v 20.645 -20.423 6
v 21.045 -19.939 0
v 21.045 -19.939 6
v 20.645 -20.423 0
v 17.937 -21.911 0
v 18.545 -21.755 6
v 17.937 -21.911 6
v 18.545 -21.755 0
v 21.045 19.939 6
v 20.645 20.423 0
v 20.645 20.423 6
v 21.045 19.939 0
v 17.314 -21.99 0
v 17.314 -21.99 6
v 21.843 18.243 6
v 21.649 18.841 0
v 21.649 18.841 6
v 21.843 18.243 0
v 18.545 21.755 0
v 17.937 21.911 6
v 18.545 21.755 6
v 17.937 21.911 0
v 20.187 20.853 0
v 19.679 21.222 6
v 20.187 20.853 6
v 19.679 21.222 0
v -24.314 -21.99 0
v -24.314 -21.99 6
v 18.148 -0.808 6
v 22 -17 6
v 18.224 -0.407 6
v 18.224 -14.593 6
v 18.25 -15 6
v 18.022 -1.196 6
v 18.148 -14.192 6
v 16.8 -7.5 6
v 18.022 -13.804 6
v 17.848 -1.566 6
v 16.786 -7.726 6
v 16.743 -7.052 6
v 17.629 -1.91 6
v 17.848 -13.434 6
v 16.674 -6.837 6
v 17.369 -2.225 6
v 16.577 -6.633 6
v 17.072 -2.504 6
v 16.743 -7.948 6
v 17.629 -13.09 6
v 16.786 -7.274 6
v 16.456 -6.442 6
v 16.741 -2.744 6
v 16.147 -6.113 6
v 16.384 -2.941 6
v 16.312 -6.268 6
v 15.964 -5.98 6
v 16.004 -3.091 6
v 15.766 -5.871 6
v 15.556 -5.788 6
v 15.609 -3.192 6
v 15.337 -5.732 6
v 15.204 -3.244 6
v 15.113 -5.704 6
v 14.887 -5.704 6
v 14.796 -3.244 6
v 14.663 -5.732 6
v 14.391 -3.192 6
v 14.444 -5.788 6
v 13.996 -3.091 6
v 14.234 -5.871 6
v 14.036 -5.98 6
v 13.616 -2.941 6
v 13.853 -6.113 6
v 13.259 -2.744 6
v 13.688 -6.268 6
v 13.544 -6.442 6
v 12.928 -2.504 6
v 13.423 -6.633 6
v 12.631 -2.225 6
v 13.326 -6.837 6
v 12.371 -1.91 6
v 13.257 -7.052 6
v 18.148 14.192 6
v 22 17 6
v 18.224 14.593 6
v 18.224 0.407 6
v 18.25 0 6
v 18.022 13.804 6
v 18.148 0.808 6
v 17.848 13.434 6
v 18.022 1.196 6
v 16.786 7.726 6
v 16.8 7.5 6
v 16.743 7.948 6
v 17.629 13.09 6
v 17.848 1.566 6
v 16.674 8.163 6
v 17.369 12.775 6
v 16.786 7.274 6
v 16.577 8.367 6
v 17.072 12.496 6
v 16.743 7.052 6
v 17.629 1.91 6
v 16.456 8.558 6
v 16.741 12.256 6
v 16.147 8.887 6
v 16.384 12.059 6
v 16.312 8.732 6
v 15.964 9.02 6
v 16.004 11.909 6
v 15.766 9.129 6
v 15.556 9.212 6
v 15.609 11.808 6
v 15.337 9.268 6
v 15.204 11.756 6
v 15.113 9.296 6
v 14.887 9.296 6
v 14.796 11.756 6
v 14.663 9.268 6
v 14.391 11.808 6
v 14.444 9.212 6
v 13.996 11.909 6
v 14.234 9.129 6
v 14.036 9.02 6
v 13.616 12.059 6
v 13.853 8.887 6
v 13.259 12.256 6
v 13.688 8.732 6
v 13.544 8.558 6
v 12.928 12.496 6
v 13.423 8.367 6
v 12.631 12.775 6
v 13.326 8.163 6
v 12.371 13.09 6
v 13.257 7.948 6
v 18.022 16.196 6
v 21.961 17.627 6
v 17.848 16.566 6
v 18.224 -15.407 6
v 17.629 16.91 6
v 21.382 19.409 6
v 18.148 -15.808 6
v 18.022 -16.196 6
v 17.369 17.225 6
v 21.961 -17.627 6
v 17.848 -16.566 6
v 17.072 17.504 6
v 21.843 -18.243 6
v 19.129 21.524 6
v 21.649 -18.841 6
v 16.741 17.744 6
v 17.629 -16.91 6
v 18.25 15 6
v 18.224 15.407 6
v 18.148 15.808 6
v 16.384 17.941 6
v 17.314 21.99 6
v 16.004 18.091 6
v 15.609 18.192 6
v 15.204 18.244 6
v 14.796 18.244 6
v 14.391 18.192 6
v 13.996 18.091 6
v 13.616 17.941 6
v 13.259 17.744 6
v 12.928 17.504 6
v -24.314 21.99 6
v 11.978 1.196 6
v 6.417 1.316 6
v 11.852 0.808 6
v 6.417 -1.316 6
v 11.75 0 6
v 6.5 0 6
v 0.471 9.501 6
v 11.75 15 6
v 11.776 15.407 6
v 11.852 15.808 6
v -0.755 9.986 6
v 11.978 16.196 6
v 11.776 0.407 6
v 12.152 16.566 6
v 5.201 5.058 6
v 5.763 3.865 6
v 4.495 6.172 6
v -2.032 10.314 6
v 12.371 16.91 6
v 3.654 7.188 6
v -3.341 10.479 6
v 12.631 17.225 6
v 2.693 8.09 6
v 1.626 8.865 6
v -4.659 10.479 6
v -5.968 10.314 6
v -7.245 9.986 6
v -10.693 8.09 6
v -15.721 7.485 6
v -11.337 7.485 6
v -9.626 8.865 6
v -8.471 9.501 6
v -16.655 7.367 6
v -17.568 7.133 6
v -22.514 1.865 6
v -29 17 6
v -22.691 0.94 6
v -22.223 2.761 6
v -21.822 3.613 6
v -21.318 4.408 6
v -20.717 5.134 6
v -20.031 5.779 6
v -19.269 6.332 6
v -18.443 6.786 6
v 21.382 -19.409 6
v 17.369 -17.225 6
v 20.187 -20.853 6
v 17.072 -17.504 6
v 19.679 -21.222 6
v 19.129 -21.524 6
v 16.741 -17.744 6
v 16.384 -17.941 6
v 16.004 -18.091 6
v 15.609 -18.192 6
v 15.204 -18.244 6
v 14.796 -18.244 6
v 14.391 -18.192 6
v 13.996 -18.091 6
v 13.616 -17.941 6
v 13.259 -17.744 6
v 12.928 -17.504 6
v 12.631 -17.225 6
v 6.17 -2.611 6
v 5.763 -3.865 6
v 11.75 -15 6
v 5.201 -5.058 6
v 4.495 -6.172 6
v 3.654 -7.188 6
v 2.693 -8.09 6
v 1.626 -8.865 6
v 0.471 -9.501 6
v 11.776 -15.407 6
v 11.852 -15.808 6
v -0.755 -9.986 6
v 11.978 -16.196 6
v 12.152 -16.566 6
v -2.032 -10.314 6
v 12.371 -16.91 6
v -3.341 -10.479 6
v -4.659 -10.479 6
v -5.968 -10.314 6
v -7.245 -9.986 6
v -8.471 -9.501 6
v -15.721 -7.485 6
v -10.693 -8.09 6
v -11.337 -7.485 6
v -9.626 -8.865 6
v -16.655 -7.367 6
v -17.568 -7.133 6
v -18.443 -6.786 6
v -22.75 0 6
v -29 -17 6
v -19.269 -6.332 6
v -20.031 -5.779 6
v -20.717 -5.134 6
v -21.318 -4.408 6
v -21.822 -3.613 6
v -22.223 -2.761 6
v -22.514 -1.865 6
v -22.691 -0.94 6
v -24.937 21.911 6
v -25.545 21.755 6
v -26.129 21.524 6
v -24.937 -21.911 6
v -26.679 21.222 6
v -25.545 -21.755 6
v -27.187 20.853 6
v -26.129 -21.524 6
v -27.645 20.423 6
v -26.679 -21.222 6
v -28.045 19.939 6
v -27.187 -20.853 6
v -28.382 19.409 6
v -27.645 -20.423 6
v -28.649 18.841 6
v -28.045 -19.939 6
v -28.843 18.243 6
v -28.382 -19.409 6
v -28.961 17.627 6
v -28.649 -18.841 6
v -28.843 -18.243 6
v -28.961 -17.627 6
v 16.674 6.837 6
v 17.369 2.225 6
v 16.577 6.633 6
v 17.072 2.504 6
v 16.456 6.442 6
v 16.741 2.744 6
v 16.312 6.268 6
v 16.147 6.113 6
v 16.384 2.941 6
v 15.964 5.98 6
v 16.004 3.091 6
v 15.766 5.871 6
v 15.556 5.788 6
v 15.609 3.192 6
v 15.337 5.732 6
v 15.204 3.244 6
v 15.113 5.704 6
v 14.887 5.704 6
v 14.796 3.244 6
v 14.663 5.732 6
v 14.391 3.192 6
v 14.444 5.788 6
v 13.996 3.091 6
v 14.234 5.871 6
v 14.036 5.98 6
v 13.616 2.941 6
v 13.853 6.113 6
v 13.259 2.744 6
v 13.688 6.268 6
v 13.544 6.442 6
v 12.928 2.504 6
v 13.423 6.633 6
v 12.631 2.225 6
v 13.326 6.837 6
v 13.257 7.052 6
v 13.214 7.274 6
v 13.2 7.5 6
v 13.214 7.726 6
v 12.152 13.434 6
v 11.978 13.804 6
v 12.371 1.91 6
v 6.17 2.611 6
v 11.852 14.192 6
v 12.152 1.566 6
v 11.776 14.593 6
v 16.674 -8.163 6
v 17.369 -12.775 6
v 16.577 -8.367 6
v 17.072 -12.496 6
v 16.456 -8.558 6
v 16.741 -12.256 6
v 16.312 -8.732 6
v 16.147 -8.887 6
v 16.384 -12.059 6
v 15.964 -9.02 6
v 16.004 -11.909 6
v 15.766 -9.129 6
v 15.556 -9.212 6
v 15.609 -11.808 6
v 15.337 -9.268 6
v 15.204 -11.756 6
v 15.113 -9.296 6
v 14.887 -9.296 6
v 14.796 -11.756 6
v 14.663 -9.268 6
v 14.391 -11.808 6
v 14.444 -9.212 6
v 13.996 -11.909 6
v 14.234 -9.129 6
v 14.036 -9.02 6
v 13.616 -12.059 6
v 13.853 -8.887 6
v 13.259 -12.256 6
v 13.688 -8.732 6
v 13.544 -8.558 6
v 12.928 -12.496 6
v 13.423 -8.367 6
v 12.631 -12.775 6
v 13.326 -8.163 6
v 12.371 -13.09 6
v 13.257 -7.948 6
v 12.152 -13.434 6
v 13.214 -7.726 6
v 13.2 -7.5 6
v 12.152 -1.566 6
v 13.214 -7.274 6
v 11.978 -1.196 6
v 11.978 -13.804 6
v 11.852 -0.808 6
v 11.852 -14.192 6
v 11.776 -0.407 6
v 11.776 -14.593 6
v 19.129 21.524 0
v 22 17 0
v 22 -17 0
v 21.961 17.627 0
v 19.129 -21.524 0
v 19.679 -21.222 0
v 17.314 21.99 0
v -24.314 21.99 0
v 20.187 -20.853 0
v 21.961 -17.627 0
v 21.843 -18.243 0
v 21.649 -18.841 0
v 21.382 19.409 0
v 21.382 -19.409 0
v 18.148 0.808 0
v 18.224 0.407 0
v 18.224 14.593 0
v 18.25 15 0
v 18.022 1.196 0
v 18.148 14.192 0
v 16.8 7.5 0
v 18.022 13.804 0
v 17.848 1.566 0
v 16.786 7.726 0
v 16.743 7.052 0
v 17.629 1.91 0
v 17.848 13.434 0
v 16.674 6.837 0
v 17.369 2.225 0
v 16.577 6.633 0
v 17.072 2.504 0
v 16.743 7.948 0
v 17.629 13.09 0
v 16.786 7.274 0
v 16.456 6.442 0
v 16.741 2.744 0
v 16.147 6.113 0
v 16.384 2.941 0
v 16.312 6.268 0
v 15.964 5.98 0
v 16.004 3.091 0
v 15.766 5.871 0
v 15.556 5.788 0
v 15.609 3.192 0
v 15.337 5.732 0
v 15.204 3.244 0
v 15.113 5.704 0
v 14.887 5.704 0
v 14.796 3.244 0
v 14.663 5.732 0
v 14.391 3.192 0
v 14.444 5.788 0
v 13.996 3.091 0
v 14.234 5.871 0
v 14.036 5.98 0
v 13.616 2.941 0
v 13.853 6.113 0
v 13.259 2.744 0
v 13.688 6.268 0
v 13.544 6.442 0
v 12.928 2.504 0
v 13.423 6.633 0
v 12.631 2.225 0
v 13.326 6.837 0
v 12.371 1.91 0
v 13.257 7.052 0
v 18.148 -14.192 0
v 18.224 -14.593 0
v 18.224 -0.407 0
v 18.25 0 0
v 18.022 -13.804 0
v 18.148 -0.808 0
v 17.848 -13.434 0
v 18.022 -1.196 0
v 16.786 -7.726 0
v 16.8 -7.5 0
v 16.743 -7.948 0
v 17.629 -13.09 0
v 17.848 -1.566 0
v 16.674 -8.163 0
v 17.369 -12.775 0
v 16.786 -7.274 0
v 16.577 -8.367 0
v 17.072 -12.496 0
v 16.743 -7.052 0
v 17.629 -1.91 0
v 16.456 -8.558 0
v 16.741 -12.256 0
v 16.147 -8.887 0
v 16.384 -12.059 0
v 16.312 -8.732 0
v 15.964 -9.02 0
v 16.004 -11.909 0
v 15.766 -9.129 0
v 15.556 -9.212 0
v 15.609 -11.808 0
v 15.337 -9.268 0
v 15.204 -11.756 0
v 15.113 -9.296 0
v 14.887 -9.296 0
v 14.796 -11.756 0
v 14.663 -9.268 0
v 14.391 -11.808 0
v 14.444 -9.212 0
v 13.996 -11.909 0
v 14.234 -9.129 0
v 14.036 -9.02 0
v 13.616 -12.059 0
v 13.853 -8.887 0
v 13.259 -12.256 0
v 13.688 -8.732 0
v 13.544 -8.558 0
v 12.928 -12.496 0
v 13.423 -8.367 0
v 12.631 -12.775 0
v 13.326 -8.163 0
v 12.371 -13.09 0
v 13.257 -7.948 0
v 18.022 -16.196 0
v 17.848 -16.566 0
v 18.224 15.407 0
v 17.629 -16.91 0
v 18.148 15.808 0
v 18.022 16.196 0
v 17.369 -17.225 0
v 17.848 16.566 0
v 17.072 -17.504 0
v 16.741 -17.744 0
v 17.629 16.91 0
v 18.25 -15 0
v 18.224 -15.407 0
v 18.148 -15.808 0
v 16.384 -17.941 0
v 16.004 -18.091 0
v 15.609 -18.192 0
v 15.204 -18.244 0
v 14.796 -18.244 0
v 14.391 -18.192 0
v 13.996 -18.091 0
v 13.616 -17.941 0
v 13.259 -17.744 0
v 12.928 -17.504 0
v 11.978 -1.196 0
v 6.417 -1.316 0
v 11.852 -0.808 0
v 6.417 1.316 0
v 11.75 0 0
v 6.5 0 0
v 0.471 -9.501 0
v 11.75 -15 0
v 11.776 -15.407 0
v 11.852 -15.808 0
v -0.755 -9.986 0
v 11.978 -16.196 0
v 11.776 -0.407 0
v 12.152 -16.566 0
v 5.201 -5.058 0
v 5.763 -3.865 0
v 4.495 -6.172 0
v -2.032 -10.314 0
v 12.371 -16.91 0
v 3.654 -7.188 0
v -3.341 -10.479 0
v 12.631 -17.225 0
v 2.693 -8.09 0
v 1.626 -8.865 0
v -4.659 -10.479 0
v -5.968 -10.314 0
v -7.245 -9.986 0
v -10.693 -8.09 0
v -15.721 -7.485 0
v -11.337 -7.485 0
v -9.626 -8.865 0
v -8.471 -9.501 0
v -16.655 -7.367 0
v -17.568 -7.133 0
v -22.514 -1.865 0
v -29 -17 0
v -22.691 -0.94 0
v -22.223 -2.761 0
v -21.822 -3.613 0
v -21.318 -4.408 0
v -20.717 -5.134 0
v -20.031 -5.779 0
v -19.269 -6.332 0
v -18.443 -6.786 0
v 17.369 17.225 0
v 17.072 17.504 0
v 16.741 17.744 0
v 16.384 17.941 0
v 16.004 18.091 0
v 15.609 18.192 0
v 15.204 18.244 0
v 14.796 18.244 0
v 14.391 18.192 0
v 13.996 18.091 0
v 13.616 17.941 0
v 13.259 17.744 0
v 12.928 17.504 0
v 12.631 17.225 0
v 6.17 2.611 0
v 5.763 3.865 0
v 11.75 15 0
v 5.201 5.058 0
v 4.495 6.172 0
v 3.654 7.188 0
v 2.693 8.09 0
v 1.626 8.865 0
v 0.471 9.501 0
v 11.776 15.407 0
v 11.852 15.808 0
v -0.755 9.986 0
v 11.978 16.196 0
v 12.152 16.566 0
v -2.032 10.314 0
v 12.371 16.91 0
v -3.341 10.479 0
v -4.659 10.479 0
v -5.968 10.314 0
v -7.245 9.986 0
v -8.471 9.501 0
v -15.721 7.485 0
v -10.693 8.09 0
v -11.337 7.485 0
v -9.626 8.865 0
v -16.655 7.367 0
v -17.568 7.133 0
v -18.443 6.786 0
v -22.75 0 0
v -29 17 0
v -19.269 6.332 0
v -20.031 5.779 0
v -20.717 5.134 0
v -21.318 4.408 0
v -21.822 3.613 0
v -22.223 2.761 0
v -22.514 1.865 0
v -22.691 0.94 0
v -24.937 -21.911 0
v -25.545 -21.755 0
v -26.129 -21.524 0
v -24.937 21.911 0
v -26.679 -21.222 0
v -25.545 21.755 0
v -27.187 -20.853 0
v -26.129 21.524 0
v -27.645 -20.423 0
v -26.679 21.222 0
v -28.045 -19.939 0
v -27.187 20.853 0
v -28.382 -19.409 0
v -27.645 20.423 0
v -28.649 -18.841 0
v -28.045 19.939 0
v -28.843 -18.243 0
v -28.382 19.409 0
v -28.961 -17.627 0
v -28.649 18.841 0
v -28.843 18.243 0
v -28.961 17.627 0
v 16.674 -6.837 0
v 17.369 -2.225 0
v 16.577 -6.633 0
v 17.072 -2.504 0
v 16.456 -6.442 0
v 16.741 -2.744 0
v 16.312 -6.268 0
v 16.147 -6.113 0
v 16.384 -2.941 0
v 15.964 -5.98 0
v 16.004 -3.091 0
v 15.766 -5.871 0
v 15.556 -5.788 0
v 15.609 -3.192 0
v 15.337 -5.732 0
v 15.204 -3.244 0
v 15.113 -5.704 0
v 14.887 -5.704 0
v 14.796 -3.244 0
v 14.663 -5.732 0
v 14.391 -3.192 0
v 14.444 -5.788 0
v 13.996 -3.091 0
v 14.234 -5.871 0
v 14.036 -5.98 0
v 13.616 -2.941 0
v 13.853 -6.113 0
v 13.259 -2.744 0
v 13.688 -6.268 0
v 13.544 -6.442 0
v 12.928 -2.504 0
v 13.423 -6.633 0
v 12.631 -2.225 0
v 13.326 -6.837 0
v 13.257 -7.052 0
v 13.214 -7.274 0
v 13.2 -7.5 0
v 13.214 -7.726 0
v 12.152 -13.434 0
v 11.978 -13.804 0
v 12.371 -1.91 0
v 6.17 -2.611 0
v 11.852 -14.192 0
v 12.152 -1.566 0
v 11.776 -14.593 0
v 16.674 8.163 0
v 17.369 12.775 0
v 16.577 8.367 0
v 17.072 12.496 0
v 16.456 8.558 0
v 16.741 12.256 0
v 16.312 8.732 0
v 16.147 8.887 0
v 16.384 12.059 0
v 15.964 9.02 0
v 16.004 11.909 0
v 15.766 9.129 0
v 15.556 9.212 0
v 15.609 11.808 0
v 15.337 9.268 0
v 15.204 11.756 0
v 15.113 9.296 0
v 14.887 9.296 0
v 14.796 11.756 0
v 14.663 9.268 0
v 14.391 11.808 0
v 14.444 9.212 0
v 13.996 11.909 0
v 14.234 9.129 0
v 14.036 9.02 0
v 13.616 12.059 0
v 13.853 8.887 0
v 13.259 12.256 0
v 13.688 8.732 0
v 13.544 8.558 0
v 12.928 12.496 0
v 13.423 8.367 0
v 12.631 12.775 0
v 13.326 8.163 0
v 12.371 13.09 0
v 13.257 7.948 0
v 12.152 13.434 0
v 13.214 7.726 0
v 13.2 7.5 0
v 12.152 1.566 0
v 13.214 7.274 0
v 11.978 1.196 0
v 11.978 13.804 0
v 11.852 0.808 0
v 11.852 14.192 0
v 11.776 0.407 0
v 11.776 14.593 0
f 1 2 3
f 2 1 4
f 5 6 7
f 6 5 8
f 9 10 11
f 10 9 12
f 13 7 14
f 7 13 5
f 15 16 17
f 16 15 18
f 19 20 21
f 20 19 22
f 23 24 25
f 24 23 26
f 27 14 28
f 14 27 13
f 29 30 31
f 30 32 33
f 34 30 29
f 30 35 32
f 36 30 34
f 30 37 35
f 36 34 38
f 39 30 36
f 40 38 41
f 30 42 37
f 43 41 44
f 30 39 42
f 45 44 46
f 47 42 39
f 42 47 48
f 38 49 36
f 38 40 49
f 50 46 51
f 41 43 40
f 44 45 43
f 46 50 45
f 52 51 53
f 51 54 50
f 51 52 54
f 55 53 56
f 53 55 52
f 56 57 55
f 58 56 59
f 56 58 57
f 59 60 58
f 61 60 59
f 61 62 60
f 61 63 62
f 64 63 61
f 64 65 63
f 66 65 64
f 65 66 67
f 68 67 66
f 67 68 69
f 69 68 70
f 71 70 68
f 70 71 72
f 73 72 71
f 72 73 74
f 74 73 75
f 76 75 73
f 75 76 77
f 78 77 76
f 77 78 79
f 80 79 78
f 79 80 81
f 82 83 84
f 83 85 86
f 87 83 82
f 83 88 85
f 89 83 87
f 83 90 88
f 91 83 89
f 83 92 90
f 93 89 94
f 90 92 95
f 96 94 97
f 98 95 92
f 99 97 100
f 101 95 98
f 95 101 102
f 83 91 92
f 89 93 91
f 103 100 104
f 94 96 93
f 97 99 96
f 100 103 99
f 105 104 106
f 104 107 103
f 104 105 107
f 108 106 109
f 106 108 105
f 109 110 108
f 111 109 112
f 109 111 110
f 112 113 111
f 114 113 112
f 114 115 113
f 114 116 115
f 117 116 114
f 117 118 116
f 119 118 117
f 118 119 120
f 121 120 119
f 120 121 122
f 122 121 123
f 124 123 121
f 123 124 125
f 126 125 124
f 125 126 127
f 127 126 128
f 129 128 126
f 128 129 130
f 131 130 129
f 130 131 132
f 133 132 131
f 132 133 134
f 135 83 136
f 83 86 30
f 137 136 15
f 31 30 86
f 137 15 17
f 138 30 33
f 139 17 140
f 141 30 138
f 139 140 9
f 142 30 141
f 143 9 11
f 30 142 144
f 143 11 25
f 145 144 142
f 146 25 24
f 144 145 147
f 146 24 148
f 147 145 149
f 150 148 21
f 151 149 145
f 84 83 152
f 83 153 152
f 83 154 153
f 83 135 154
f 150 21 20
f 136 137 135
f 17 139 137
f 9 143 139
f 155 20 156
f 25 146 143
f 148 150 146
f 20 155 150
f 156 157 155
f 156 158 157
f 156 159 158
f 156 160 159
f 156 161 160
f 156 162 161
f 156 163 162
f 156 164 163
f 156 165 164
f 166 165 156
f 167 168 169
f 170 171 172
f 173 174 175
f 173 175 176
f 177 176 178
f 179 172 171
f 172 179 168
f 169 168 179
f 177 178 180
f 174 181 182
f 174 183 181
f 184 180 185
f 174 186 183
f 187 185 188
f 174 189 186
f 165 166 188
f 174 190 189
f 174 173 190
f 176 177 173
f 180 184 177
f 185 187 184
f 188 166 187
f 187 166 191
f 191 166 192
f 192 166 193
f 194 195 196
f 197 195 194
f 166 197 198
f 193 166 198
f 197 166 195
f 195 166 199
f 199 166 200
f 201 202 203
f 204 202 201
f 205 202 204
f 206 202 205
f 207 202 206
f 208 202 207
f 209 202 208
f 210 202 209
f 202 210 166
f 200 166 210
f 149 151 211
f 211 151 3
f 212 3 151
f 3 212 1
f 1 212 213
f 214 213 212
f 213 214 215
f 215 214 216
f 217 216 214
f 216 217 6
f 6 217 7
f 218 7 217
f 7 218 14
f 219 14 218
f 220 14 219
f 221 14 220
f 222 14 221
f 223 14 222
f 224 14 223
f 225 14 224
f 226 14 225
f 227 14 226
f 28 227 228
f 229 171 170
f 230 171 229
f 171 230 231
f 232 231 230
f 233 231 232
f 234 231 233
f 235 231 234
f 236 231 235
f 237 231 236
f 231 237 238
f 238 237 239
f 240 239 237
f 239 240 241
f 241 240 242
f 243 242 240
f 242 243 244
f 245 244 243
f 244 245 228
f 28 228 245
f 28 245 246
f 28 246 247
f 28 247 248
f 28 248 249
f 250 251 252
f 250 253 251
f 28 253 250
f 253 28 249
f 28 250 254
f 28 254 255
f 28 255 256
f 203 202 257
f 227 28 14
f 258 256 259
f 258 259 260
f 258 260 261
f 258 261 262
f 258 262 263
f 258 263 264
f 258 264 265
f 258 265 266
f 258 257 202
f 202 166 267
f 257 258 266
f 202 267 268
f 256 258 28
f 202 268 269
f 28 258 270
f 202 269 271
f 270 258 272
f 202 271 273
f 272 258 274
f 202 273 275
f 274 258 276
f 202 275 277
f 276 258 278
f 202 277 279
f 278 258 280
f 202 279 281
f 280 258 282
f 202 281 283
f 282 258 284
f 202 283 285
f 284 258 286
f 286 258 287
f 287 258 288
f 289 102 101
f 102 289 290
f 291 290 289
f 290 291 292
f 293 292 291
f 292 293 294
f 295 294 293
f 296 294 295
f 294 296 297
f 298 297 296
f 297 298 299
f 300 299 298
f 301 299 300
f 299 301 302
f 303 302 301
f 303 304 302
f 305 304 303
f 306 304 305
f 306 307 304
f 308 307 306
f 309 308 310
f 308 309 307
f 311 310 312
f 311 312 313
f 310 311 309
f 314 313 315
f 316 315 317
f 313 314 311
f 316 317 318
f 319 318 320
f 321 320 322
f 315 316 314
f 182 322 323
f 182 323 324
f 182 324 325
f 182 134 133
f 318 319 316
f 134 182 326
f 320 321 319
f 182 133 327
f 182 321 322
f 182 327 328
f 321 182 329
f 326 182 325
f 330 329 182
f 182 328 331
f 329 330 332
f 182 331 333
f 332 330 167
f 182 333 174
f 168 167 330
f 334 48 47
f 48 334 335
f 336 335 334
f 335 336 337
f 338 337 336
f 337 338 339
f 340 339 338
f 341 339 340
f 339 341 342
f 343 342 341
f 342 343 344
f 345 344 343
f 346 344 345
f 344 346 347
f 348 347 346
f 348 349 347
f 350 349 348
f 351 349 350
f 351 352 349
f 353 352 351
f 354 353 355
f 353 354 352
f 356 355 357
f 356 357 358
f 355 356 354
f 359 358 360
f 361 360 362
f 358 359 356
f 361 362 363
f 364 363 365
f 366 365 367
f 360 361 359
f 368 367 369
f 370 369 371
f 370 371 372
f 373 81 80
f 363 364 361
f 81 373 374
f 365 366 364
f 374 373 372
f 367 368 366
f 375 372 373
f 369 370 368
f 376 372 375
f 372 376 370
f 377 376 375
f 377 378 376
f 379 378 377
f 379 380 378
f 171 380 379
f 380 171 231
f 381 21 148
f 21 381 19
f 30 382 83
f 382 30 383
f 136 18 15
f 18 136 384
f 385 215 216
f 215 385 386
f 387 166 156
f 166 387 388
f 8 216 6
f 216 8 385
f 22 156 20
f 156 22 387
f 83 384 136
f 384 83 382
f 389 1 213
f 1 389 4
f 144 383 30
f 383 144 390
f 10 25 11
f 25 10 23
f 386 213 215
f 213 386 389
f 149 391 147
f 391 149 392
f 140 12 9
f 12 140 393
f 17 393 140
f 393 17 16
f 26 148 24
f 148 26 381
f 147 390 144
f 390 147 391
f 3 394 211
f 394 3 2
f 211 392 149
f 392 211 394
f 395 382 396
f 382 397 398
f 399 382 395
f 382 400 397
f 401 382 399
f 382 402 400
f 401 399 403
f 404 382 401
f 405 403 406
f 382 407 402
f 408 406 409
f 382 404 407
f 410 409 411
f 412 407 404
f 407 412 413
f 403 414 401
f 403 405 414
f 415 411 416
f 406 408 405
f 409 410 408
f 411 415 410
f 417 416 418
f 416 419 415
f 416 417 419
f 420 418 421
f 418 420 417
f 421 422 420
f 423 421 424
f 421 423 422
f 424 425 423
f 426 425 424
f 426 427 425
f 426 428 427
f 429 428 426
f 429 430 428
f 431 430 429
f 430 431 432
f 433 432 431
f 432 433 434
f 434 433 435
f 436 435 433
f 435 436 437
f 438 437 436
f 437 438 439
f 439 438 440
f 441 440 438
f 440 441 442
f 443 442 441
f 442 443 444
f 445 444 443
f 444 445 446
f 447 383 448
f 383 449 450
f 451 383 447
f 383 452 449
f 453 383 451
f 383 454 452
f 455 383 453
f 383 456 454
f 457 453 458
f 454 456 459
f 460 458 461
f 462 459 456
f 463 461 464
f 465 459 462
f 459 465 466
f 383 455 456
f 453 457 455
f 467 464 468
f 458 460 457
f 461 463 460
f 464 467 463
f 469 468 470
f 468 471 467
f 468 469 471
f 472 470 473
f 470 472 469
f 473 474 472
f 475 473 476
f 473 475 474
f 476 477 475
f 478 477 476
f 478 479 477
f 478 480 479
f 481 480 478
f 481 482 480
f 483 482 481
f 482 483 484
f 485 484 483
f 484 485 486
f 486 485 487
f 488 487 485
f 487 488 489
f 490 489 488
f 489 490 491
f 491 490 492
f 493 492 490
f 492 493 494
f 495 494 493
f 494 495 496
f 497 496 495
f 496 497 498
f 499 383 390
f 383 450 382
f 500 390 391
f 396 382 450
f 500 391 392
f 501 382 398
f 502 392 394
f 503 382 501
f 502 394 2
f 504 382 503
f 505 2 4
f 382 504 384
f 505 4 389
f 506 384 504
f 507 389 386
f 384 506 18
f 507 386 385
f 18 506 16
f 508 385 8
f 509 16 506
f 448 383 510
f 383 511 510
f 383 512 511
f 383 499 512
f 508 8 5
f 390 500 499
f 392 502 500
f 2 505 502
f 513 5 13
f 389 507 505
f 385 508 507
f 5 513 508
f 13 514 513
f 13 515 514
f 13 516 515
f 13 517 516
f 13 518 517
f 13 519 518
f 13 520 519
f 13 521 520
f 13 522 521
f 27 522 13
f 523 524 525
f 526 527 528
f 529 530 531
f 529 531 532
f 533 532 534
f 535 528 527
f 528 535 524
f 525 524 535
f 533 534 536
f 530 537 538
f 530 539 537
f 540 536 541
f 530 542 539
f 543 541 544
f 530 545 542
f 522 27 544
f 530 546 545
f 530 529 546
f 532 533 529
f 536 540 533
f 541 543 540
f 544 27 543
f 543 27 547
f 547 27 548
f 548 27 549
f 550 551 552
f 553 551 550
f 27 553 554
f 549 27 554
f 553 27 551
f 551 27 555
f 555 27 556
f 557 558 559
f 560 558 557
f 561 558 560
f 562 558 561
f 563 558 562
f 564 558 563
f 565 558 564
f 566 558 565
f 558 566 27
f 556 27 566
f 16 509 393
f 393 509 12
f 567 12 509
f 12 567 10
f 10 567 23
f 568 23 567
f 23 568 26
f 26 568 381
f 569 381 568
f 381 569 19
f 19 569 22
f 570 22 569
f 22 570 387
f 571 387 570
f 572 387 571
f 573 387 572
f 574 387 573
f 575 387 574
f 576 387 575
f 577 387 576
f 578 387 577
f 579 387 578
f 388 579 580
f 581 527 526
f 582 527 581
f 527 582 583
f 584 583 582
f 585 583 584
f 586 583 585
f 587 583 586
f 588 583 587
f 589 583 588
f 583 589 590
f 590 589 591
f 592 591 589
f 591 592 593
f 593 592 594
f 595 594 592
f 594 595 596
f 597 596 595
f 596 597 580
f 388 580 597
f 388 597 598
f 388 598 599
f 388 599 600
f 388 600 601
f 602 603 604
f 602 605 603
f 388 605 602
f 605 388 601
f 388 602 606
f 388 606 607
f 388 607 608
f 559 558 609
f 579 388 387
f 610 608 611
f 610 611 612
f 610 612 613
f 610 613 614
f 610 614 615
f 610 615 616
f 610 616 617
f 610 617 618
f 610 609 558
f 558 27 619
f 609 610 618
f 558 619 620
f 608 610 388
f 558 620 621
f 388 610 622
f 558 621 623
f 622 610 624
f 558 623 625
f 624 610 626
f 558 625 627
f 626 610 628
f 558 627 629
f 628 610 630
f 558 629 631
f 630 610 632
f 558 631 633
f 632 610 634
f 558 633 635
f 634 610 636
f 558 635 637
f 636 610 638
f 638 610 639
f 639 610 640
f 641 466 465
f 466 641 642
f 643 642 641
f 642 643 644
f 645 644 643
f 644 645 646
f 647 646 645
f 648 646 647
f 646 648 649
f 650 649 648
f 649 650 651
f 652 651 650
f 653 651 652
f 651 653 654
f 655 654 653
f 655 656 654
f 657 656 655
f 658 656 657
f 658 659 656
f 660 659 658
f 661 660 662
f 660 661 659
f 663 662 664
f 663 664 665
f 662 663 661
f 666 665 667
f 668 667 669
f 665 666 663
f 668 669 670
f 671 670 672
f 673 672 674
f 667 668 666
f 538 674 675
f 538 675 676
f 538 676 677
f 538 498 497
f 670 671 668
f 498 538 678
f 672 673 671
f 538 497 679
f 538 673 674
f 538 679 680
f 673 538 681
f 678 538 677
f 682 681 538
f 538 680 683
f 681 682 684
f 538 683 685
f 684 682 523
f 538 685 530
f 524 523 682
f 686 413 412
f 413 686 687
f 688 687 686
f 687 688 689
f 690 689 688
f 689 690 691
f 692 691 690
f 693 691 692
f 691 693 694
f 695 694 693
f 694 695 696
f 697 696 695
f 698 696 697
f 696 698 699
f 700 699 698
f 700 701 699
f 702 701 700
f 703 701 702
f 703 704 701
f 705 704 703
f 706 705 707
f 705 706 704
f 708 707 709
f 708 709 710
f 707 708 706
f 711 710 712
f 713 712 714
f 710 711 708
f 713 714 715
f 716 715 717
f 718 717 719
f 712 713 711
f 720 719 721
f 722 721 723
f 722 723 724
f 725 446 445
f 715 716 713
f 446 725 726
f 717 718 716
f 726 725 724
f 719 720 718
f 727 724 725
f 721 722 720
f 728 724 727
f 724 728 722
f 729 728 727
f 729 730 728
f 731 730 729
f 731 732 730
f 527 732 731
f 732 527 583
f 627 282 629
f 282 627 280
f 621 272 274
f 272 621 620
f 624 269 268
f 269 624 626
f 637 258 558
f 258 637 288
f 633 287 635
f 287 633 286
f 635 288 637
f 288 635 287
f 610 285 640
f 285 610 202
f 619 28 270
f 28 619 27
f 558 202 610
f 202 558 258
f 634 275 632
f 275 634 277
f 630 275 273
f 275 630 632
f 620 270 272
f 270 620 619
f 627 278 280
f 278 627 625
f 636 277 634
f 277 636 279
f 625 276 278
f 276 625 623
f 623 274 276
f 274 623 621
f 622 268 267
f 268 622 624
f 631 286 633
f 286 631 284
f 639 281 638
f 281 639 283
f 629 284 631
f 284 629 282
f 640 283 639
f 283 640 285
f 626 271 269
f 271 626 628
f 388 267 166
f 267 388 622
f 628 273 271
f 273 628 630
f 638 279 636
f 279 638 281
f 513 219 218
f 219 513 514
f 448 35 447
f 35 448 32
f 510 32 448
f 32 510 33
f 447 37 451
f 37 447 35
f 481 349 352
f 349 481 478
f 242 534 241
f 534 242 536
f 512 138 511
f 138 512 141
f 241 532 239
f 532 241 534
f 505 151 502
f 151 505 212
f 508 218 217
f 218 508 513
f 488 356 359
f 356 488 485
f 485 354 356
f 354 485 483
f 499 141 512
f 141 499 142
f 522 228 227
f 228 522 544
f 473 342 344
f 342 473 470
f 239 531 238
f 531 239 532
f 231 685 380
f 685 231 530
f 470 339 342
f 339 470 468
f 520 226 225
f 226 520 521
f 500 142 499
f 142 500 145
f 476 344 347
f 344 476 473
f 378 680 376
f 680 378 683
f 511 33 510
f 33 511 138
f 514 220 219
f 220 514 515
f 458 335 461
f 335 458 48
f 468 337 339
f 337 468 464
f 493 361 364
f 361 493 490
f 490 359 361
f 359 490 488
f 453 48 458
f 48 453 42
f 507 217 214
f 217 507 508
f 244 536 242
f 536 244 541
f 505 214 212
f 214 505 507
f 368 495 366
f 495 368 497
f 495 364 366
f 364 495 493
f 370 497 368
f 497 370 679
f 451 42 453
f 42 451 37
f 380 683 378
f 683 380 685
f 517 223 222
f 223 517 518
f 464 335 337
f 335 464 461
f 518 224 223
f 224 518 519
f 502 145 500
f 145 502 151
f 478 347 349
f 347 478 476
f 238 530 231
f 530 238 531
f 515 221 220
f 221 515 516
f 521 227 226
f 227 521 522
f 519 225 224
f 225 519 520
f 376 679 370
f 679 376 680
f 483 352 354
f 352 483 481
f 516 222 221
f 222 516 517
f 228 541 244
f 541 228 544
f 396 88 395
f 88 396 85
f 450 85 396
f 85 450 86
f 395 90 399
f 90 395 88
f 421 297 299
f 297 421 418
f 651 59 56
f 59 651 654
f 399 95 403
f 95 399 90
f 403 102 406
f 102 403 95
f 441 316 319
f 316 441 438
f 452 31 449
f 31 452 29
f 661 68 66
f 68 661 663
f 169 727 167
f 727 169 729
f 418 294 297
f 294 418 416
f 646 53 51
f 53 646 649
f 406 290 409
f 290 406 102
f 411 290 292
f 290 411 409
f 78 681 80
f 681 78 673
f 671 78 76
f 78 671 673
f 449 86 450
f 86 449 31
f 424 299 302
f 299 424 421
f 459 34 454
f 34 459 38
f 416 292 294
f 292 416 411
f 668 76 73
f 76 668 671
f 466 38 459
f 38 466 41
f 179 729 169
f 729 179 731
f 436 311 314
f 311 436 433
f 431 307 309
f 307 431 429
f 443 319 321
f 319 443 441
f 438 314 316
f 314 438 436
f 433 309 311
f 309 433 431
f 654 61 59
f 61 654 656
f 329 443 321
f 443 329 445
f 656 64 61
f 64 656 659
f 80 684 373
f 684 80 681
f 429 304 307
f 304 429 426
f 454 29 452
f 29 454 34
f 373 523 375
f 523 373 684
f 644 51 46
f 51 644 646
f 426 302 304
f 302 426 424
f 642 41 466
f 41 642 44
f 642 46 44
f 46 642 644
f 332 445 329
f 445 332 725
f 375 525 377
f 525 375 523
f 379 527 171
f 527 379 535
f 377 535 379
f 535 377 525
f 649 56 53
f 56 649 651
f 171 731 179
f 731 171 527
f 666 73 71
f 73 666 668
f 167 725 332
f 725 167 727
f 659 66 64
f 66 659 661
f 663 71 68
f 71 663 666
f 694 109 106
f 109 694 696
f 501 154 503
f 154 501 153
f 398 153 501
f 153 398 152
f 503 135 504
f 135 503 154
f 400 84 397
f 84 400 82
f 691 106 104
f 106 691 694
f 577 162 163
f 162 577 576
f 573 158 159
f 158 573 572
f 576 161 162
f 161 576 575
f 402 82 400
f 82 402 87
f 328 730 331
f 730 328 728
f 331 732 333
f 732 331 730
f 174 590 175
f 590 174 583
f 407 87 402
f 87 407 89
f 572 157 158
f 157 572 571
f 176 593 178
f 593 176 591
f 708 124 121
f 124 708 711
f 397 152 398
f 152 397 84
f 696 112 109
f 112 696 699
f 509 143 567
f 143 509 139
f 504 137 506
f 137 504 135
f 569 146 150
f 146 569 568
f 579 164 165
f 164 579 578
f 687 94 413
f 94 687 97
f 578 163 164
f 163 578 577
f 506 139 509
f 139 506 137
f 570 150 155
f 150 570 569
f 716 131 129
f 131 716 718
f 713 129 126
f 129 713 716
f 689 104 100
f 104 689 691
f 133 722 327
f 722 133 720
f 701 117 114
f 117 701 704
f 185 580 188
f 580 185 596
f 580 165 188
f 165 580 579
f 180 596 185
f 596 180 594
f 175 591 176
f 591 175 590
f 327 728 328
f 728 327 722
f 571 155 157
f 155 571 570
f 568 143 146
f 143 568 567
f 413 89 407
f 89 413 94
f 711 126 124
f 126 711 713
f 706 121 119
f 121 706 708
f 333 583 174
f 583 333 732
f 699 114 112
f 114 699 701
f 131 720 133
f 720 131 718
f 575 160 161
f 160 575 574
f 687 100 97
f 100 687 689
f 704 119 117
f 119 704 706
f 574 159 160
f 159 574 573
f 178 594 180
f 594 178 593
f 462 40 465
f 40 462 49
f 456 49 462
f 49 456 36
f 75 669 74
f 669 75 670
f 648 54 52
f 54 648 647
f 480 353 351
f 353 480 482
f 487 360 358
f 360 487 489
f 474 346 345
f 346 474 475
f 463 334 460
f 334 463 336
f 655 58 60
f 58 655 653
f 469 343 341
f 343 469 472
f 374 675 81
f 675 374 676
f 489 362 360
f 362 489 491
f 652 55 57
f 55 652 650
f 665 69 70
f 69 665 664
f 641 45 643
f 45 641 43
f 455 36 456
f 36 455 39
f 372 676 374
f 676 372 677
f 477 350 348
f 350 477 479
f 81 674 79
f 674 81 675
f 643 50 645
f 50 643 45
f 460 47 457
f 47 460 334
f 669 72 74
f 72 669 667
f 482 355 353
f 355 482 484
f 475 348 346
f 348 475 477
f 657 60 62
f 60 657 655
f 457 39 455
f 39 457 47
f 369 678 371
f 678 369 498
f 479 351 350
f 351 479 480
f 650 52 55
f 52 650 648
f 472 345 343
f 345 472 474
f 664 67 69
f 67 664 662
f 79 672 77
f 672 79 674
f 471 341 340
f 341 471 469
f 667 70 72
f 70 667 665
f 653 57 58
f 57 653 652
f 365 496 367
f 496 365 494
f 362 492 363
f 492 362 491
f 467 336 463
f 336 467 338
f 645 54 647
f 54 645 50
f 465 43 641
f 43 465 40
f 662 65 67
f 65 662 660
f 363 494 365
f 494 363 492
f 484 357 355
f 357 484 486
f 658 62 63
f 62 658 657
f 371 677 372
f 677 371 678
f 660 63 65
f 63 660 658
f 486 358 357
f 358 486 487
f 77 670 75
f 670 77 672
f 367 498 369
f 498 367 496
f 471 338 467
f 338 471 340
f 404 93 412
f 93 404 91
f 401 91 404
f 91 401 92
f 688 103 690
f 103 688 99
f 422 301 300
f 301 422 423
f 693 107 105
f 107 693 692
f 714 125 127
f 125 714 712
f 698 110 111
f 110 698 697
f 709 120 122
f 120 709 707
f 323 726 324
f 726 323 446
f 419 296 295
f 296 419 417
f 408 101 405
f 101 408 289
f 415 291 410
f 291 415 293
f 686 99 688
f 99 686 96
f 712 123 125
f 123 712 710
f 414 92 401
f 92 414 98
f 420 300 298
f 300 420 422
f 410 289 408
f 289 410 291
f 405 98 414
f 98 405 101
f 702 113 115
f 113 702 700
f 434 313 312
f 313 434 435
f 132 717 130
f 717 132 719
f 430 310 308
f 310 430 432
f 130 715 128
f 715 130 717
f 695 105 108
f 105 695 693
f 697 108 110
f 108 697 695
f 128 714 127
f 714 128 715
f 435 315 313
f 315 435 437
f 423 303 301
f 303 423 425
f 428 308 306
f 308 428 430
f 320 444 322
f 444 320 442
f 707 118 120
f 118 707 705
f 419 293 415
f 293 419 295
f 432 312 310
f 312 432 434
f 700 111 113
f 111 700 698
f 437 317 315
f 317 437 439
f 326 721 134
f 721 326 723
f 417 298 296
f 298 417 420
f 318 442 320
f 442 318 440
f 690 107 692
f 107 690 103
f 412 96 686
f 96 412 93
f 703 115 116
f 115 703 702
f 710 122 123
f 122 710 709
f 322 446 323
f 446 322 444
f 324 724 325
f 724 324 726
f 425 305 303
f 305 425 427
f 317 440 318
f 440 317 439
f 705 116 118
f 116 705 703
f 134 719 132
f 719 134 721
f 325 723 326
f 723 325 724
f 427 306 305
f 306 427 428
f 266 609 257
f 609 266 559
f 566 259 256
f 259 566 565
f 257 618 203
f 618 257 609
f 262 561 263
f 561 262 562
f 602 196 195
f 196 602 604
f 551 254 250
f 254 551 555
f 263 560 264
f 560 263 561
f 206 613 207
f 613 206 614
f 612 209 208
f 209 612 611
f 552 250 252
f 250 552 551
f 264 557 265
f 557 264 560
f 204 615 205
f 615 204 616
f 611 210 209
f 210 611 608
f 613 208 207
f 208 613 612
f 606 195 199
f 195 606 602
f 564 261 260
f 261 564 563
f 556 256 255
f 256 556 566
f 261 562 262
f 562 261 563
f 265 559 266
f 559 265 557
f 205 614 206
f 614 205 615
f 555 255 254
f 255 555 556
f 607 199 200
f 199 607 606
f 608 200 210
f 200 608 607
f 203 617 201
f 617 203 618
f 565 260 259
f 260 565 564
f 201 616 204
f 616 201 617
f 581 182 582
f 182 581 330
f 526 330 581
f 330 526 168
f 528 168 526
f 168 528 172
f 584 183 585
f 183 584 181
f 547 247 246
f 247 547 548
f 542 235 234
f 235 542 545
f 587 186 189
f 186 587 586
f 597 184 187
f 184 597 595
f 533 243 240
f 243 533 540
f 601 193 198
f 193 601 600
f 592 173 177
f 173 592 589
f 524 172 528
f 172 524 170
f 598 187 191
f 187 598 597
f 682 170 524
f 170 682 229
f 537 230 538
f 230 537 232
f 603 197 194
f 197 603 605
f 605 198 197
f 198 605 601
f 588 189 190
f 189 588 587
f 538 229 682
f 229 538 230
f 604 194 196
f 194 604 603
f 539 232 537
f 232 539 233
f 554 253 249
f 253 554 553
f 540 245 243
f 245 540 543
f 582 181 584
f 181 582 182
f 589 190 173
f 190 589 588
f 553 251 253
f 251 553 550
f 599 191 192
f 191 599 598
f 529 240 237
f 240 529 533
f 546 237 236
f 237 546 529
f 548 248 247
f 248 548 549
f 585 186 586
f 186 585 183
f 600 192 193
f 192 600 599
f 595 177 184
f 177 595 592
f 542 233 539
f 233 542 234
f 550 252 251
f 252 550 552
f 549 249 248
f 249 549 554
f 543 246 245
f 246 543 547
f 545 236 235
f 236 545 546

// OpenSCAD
$fn = 50;


difference() {
	union() {
		hull() {
			translate(v = [-17.0000000000, 17.0000000000, 0]) {
				cylinder(h = 6, r = 5);
			}
			translate(v = [17.0000000000, 17.0000000000, 0]) {
				cylinder(h = 6, r = 5);
			}
			translate(v = [-17.0000000000, -17.0000000000, 0]) {
				cylinder(h = 6, r = 5);
			}
			translate(v = [17.0000000000, -17.0000000000, 0]) {
				cylinder(h = 6, r = 5);
			}
		}
		translate(v = [-7.0000000000, 0, 0]) {
			hull() {
				translate(v = [-17.0000000000, 17.0000000000, 0]) {
					cylinder(h = 6, r = 5);
				}
				translate(v = [17.0000000000, 17.0000000000, 0]) {
					cylinder(h = 6, r = 5);
				}
				translate(v = [-17.0000000000, -17.0000000000, 0]) {
					cylinder(h = 6, r = 5);
				}
				translate(v = [17.0000000000, -17.0000000000, 0]) {
					cylinder(h = 6, r = 5);
				}
			}
		}
	}
	union() {
		translate(v = [15.0000000000, -15.0000000000, 0]) {
			cylinder(h = 6, r = 3.2500000000);
		}
		translate(v = [15.0000000000, 0.0000000000, 0]) {
			cylinder(h = 6, r = 3.2500000000);
		}
		translate(v = [15.0000000000, 15.0000000000, 0]) {
			cylinder(h = 6, r = 3.2500000000);
		}
		translate(v = [15.0000000000, -15.0000000000, 0]) {
			cylinder(h = 6, r = 1.8000000000);
		}
		translate(v = [15.0000000000, -7.5000000000, 0]) {
			cylinder(h = 6, r = 1.8000000000);
		}
		translate(v = [15.0000000000, 0.0000000000, 0]) {
			cylinder(h = 6, r = 1.8000000000);
		}
		translate(v = [15.0000000000, 7.5000000000, 0]) {
			cylinder(h = 6, r = 1.8000000000);
		}
		translate(v = [15.0000000000, 15.0000000000, 0]) {
			cylinder(h = 6, r = 1.8000000000);
		}
		translate(v = [15.0000000000, -15.0000000000, 0]) {
			cylinder(h = 6, r = 1.8000000000);
		}
		translate(v = [15.0000000000, -7.5000000000, 0]) {
			cylinder(h = 6, r = 1.8000000000);
		}
		translate(v = [15.0000000000, 0.0000000000, 0]) {
			cylinder(h = 6, r = 1.8000000000);
		}
		translate(v = [15.0000000000, 7.5000000000, 0]) {
			cylinder(h = 6, r = 1.8000000000);
		}
		translate(v = [15.0000000000, 15.0000000000, 0]) {
			cylinder(h = 6, r = 1.8000000000);
		}
		translate(v = [15.0000000000, -15.0000000000, 0]) {
			cylinder(h = 6, r = 1.8000000000);
		}
		translate(v = [15.0000000000, -7.5000000000, 0]) {
			cylinder(h = 6, r = 1.8000000000);
		}
		translate(v = [15.0000000000, 0.0000000000, 0]) {
			cylinder(h = 6, r = 1.8000000000);
		}
		translate(v = [15.0000000000, 7.5000000000, 0]) {
			cylinder(h = 6, r = 1.8000000000);
		}
		translate(v = [15.0000000000, 15.0000000000, 0]) {
			cylinder(h = 6, r = 1.8000000000);
		}
		translate(v = [-11.5000000000, 0, 0]) {
			hull() {
				translate(v = [-3.7500000000, 0.0000000000, 0]) {
					cylinder(h = 6, r = 7.5000000000);
				}
				translate(v = [3.7500000000, 0.0000000000, 0]) {
					cylinder(h = 6, r = 7.5000000000);
				}
				translate(v = [-3.7500000000, -0.0000000000, 0]) {
					cylinder(h = 6, r = 7.5000000000);
				}
				translate(v = [3.7500000000, -0.0000000000, 0]) {
					cylinder(h = 6, r = 7.5000000000);
				}
			}
		}
		translate(v = [-4.0000000000, 0, 0.0000000000]) {
			cylinder(h = 6, r = 10.5000000000);
		}
	}
}
